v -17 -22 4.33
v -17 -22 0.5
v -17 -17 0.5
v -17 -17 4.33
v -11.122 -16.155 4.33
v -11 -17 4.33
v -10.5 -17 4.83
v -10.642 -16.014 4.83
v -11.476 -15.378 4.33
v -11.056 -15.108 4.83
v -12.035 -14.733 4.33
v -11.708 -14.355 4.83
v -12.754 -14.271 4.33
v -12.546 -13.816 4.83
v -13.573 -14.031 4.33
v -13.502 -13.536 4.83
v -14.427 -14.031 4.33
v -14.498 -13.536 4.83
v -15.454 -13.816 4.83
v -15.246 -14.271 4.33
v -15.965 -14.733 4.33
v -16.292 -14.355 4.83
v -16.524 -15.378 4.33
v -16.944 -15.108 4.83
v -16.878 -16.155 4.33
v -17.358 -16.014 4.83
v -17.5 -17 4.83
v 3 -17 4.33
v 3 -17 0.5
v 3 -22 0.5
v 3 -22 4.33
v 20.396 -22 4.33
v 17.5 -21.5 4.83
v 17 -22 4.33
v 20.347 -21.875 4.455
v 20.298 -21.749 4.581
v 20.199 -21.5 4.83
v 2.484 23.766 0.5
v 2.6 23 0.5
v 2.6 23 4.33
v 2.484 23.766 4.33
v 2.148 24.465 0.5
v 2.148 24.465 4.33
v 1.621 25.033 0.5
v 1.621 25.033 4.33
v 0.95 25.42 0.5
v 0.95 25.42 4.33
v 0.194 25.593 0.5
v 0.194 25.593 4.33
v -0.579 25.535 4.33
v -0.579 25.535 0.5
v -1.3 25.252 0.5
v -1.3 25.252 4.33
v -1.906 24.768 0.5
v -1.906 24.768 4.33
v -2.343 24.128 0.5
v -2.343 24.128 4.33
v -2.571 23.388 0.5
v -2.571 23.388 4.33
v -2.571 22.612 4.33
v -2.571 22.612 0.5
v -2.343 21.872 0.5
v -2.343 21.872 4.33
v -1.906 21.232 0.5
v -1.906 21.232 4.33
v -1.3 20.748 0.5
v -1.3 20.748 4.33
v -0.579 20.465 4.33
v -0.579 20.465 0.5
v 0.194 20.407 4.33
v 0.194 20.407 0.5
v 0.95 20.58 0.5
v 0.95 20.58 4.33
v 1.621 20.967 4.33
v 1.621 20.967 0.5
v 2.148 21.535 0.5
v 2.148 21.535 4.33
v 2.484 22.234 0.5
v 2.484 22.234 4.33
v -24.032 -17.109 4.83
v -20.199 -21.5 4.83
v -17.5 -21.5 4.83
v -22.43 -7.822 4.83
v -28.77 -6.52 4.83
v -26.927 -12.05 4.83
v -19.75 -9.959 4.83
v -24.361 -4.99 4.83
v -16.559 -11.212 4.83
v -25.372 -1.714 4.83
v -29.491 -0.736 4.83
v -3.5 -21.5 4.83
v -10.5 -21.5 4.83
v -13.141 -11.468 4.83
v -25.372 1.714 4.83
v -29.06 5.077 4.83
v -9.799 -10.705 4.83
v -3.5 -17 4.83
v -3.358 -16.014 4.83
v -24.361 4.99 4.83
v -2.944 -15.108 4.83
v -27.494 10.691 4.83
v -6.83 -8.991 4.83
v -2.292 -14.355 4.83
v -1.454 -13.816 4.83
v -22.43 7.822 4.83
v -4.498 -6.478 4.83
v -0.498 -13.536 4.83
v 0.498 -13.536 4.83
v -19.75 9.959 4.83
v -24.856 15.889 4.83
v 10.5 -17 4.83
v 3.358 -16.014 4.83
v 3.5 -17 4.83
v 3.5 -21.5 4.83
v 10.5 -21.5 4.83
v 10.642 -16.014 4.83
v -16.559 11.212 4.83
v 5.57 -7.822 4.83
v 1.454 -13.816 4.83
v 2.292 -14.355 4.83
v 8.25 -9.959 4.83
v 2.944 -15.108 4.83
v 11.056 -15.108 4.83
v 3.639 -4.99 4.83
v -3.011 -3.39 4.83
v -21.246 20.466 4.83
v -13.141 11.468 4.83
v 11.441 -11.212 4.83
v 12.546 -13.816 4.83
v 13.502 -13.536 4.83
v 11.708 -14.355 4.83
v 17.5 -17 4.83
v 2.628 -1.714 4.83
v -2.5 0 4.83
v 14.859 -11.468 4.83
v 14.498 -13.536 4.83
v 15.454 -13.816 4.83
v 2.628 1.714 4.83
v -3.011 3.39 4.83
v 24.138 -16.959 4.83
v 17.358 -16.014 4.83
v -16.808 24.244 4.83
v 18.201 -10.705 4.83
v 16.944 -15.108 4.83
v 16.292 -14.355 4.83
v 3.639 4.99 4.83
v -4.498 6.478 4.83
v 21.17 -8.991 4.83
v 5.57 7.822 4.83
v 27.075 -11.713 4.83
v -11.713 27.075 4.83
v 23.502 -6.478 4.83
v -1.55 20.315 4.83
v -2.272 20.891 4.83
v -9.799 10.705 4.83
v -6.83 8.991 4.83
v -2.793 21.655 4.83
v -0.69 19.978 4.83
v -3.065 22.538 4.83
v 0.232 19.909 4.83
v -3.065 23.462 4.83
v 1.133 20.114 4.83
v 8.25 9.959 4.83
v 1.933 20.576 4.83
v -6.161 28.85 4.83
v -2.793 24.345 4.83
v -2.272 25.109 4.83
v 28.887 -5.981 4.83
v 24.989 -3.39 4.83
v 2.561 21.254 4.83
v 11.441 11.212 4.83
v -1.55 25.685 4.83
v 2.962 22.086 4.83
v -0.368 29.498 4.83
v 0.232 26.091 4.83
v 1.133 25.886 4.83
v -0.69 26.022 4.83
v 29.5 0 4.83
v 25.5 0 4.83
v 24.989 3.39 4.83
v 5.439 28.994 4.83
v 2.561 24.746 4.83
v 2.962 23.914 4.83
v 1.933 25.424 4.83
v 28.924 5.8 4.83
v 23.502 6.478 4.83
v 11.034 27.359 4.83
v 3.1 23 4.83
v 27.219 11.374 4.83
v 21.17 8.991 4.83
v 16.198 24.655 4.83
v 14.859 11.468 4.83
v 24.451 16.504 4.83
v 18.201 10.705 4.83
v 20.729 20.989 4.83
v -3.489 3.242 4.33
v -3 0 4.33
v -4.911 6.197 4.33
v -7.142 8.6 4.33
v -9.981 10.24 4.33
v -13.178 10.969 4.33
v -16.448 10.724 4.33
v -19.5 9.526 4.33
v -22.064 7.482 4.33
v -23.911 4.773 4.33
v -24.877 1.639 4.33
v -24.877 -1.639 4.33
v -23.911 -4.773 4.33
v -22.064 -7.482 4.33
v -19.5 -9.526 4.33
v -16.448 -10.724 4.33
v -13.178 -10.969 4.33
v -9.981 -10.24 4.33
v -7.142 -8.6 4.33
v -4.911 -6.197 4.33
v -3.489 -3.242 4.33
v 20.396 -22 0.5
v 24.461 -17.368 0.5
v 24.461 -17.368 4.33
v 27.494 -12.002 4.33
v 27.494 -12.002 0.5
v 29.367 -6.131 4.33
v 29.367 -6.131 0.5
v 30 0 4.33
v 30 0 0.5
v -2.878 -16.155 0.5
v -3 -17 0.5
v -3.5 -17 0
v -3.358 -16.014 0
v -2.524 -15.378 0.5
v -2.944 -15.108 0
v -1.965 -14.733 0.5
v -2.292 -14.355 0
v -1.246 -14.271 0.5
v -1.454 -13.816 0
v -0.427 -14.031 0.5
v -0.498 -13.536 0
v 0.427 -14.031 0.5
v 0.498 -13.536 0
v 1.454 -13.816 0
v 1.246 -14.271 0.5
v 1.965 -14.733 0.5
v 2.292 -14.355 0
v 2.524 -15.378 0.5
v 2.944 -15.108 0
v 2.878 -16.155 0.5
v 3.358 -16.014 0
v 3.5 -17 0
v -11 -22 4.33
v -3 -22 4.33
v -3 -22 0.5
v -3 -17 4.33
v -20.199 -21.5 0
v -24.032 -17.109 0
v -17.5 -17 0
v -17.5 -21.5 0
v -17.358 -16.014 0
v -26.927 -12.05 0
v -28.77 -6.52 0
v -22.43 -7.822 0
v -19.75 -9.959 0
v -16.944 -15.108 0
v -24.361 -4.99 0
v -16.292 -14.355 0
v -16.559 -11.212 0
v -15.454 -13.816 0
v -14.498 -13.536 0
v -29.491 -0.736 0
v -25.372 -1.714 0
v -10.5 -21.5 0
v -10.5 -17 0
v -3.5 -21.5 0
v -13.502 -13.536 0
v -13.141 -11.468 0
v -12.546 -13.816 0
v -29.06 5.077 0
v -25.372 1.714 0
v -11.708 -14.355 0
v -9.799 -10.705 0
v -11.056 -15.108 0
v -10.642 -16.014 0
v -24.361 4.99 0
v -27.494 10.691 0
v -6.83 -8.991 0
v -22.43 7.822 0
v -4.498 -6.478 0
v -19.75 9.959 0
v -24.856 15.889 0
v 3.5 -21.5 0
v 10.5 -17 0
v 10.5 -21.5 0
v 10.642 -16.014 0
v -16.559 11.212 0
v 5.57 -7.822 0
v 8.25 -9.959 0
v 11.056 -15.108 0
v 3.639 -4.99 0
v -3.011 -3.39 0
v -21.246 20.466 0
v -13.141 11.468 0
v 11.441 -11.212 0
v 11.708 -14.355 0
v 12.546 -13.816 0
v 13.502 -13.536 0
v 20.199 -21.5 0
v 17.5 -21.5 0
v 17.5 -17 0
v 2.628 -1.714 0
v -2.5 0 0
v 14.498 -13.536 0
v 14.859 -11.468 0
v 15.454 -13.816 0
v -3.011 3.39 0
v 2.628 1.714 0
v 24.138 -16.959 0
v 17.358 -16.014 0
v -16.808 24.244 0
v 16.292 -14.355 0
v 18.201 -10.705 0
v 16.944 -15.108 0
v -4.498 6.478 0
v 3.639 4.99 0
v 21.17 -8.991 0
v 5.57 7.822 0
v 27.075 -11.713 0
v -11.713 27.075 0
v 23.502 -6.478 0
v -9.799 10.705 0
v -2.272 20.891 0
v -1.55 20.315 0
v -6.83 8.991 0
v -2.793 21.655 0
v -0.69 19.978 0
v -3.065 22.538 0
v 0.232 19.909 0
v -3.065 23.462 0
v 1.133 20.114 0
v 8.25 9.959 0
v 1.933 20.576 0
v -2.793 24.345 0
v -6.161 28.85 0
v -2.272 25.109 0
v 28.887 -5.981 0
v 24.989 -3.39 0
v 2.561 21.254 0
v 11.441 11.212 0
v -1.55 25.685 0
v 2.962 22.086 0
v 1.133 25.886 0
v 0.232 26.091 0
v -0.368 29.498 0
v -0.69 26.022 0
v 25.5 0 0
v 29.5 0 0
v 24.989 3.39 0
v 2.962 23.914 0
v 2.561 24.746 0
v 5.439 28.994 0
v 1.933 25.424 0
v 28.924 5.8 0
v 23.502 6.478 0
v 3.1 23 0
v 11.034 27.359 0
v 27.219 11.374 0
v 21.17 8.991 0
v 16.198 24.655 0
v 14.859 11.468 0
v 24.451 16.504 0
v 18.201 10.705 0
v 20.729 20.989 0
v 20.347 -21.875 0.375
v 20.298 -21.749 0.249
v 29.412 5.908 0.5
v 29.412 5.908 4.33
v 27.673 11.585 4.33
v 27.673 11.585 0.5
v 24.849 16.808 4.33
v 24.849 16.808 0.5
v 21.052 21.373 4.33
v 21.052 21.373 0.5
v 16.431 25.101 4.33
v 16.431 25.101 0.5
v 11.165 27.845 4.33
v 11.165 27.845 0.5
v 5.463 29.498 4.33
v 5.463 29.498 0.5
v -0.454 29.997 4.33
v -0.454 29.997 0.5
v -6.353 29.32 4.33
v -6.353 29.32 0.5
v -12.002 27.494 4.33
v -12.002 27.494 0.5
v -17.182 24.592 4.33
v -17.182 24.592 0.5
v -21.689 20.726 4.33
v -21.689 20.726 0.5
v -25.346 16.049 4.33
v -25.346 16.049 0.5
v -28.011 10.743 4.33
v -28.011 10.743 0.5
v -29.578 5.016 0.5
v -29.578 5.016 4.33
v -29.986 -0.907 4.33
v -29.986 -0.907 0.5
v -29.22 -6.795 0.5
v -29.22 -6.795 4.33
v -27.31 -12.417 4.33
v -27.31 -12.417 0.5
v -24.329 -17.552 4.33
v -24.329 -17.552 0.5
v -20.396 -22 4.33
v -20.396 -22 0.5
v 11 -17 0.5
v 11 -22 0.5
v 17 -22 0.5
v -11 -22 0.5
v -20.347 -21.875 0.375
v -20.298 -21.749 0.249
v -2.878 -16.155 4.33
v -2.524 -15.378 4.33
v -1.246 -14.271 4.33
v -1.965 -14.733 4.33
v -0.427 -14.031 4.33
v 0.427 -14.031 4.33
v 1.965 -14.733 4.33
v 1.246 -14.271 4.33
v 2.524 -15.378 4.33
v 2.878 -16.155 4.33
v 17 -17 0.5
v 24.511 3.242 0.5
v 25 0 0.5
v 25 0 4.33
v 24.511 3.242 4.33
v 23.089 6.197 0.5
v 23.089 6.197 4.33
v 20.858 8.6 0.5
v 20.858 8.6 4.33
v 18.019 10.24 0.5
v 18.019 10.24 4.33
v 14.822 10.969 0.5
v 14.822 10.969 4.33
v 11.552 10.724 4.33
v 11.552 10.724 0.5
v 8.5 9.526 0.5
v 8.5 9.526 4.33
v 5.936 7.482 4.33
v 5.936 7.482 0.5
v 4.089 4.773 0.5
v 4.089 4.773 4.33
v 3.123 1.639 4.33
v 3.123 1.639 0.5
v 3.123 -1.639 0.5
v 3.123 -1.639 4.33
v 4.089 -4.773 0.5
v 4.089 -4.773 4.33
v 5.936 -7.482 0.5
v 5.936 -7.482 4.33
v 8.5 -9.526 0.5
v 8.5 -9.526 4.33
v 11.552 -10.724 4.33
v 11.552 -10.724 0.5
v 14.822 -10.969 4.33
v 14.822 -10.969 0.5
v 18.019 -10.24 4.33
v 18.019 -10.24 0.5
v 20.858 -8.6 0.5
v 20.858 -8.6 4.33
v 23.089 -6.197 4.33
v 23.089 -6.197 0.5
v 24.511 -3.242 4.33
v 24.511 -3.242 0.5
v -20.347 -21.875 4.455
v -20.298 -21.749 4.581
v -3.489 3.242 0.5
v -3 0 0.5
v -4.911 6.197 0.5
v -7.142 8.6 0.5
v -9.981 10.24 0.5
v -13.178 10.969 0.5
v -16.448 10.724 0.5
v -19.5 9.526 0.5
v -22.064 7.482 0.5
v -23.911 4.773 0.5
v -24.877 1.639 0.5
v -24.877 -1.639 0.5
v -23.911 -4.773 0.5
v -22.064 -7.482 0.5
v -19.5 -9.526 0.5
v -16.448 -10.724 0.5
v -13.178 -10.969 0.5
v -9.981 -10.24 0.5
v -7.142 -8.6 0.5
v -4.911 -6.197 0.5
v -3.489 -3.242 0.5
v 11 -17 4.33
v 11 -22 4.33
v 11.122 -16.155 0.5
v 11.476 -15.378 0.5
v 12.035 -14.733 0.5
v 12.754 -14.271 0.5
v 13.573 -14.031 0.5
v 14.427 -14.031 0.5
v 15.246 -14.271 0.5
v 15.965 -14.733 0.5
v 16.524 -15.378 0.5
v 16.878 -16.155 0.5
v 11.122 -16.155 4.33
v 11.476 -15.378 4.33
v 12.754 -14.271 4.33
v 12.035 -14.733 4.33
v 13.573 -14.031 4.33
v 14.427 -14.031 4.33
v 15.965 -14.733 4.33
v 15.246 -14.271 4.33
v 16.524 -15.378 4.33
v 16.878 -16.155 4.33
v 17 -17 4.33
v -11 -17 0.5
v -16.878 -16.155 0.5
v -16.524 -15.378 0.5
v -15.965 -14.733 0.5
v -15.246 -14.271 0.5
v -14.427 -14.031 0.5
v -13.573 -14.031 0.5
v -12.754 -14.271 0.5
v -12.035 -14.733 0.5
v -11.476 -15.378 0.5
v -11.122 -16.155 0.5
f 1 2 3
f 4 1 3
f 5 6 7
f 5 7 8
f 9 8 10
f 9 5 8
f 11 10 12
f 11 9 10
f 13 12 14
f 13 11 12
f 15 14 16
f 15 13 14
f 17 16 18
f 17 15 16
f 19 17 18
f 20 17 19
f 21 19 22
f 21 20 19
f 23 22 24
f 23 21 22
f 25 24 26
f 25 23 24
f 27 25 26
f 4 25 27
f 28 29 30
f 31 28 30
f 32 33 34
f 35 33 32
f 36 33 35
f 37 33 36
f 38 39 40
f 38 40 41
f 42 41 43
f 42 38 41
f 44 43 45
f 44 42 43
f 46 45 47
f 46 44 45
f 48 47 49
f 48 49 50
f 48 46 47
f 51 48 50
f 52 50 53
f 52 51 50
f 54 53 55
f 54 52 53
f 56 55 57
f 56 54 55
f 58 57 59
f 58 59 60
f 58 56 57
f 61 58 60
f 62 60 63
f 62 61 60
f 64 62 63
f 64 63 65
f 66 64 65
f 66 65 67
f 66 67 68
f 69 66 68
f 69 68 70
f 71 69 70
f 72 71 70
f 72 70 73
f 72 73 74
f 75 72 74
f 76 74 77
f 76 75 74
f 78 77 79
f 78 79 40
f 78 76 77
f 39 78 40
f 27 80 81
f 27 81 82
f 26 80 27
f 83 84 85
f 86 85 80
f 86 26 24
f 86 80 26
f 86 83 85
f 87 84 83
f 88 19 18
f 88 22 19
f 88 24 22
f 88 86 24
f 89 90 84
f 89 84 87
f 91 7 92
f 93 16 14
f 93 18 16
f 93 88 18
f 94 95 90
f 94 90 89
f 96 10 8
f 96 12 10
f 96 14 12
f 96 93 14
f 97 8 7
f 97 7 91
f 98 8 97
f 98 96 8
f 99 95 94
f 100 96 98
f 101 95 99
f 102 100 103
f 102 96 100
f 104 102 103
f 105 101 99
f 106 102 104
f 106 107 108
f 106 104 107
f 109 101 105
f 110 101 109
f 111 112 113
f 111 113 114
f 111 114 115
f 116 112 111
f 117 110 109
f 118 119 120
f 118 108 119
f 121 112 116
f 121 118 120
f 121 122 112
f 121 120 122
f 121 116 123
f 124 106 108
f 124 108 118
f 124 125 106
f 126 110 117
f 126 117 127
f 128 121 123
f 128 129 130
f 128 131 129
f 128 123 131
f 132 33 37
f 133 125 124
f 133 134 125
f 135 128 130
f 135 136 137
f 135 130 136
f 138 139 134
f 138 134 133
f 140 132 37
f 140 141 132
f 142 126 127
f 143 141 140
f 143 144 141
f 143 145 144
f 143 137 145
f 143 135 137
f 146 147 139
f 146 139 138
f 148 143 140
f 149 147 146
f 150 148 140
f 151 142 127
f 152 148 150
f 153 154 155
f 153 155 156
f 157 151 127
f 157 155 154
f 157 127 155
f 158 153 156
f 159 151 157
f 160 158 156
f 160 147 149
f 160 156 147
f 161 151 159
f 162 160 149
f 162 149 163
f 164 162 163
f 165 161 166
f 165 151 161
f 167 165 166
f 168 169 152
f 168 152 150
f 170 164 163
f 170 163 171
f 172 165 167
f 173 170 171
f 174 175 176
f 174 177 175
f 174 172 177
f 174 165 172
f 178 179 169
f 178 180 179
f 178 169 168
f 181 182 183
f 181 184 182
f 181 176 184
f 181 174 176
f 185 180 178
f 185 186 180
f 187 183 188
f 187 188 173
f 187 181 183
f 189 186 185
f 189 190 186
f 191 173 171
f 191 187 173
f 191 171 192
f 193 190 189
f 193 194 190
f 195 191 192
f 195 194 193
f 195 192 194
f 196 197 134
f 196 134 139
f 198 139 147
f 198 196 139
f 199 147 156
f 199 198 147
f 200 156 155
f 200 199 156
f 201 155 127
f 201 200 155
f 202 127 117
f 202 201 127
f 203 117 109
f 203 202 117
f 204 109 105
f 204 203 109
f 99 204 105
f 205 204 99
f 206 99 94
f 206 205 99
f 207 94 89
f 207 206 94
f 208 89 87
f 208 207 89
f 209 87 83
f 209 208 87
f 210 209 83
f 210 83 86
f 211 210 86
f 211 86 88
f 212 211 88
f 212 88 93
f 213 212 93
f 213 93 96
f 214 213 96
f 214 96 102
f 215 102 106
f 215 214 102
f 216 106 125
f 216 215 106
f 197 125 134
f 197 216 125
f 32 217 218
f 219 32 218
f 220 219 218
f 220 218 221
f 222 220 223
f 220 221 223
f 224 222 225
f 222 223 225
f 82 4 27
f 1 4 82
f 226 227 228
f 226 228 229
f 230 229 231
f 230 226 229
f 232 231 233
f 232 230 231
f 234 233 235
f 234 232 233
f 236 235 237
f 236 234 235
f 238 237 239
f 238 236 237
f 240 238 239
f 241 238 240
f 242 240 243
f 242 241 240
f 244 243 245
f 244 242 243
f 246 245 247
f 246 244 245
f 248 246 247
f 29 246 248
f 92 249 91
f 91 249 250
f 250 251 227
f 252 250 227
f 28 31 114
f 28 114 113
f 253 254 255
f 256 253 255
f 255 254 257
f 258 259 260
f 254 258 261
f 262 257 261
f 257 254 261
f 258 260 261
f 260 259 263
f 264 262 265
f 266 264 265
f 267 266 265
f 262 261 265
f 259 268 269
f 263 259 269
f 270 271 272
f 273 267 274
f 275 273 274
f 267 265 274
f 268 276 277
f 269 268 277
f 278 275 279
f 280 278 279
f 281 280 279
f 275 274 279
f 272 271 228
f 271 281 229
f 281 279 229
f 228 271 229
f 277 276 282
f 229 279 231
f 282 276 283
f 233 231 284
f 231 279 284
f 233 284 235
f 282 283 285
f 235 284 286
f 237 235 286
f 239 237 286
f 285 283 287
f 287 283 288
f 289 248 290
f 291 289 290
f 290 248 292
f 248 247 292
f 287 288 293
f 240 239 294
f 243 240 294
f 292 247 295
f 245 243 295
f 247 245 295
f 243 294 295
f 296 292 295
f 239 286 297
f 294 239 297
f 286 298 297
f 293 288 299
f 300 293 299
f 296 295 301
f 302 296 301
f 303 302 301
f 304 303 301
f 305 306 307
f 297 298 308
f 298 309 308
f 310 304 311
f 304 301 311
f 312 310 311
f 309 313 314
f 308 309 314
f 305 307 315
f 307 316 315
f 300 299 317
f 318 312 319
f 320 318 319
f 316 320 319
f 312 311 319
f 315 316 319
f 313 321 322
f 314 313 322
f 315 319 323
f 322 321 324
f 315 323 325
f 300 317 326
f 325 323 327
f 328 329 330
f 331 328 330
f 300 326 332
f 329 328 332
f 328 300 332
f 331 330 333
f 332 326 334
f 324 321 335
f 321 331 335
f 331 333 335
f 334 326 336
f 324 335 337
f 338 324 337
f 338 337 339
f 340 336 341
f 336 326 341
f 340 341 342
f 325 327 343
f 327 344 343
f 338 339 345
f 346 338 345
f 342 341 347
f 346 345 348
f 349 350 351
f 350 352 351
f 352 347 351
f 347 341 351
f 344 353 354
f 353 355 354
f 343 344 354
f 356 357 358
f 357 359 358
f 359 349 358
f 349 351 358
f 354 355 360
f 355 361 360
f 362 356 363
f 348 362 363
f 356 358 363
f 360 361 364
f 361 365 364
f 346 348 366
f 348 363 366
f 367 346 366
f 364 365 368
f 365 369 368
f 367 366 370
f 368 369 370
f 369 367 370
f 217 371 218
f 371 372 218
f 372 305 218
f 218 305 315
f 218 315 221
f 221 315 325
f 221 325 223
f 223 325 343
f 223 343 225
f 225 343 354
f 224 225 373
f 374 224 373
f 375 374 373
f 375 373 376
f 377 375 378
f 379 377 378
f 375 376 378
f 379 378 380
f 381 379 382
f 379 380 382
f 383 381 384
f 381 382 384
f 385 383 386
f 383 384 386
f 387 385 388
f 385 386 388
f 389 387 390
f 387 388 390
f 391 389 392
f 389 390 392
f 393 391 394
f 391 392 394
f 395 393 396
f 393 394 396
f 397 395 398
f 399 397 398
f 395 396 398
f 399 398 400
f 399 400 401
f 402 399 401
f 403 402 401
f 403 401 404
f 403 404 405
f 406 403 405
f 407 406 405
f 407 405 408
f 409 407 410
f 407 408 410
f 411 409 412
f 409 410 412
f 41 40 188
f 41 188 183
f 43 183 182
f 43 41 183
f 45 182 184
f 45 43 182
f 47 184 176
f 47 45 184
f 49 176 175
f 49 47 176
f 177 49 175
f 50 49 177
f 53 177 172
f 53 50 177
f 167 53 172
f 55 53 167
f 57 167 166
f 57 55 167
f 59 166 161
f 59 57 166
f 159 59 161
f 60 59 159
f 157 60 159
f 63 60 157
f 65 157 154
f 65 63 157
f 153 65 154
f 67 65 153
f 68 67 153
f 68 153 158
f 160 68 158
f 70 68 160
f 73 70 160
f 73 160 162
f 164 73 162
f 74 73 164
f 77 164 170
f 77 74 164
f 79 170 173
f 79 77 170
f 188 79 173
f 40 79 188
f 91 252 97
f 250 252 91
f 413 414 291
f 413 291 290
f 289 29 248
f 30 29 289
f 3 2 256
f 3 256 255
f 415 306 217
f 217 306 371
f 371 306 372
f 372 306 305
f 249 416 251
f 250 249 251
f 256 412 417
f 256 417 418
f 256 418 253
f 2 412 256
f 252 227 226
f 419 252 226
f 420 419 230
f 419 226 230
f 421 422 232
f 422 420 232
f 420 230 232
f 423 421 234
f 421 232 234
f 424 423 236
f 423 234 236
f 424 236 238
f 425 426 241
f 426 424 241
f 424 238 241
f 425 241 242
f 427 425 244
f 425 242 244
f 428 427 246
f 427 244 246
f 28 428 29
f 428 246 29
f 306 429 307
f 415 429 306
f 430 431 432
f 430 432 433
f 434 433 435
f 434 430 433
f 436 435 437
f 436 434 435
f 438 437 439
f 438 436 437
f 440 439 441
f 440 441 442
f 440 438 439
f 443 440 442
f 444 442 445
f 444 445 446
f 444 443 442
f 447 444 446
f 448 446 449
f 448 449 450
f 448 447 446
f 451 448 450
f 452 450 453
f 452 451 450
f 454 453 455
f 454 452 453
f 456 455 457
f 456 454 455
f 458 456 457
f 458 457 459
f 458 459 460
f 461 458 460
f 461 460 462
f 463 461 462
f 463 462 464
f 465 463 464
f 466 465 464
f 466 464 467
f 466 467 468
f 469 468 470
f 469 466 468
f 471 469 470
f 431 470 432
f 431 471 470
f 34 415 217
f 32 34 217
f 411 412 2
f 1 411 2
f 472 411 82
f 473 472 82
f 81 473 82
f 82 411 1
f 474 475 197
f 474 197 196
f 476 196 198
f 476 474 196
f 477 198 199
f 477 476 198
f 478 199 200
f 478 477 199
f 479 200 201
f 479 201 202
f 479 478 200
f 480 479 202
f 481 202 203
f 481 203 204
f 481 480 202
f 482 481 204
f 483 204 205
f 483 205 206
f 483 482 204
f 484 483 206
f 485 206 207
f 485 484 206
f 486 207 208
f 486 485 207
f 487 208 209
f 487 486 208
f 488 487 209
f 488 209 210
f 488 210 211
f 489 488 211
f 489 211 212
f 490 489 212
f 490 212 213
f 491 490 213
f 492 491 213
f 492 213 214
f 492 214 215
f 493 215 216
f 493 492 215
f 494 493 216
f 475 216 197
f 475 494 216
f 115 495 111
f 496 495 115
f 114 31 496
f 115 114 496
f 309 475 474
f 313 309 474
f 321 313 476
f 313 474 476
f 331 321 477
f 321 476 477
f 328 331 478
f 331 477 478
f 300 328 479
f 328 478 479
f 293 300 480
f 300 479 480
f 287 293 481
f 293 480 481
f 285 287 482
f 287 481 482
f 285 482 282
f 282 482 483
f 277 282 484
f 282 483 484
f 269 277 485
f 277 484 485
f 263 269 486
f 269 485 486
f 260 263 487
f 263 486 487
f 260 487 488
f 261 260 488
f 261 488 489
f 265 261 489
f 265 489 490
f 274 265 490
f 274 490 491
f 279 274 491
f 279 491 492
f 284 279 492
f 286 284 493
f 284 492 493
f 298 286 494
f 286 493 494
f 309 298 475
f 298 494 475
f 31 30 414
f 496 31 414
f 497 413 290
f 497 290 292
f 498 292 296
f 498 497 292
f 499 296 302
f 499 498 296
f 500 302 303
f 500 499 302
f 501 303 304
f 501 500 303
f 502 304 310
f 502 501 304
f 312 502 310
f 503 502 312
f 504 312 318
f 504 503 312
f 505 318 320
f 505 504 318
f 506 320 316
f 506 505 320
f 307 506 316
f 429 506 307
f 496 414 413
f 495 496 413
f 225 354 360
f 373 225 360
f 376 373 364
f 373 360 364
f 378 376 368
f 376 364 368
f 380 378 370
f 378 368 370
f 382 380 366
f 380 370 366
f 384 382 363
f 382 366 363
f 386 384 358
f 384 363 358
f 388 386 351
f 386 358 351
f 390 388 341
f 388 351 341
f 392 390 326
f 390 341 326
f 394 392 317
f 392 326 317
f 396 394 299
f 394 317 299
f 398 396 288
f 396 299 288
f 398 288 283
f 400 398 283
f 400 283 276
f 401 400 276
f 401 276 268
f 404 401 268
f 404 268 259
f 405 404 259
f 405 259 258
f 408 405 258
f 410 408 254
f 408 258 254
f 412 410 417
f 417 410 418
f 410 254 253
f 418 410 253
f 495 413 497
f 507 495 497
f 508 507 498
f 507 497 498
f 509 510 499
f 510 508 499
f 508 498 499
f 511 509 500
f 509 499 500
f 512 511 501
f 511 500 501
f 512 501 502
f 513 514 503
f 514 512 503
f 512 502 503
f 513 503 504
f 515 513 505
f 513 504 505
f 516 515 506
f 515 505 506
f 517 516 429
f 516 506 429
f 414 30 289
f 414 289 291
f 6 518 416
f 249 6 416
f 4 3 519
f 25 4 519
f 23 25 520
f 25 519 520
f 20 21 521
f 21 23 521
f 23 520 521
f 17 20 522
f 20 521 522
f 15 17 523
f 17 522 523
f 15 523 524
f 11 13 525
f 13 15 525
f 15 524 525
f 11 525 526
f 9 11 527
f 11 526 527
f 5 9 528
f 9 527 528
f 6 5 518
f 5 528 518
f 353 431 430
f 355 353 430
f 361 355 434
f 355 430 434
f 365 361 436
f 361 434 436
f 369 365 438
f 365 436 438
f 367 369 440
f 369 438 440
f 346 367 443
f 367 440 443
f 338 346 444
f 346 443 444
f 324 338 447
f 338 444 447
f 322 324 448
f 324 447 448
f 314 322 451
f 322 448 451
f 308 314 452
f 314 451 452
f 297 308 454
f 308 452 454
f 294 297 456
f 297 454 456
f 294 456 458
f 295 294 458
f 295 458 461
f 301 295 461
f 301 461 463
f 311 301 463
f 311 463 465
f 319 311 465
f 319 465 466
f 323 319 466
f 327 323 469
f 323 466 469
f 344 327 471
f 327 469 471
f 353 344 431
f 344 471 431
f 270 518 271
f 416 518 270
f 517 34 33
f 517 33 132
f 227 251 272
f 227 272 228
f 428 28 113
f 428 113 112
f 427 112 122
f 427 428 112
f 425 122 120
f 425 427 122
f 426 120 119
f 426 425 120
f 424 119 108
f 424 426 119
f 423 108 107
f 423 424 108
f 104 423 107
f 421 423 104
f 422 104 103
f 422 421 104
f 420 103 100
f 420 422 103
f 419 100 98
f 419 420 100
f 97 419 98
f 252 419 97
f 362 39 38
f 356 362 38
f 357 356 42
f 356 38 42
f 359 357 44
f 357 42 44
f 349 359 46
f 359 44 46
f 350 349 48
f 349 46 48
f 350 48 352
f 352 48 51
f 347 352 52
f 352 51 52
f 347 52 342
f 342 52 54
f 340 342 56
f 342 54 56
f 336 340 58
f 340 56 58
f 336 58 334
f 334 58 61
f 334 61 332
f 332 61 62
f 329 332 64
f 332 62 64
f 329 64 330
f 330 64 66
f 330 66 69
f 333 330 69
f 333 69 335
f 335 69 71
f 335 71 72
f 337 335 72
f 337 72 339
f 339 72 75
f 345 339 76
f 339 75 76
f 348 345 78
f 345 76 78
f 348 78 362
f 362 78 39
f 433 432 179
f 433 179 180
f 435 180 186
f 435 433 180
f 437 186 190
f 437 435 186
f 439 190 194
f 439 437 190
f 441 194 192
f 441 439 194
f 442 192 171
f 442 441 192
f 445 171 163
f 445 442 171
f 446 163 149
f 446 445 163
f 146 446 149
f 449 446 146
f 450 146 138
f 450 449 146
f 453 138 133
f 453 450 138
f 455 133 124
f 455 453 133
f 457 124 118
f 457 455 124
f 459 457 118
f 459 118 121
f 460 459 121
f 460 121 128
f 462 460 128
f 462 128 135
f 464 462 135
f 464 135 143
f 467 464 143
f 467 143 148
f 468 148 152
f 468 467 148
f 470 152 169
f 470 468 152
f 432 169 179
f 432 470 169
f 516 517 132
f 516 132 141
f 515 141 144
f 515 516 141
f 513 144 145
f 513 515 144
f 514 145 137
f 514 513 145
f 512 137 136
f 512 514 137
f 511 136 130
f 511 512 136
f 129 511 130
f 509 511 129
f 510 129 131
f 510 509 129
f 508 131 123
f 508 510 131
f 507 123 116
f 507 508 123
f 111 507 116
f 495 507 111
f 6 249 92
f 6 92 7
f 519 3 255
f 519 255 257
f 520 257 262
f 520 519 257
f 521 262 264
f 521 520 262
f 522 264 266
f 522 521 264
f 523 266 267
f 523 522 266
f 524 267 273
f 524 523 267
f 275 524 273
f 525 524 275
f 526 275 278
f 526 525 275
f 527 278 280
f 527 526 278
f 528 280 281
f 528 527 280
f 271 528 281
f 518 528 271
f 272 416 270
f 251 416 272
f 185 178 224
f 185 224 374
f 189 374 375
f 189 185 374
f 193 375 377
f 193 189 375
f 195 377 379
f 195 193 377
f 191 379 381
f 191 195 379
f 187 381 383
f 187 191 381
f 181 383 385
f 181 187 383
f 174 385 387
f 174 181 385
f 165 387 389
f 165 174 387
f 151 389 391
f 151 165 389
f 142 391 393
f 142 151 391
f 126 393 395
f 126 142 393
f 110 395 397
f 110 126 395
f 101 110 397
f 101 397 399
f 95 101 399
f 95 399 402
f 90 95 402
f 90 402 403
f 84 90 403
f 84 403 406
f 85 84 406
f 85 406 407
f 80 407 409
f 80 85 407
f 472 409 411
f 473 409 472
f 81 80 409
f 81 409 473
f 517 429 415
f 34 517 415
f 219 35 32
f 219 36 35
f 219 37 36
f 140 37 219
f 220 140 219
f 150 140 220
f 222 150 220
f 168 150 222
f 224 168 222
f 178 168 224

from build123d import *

# Parameters (mm, degrees)
F0_R     = 11
F0_R_2   = 2.6
F1_DEPTH = 4.83
F3_DEPTH = 25
F4_SIZE  = 0.5


with BuildPart() as f1:
    # F0 (on Top) → F1 (new body)
    with BuildSketch(Plane.XY):
        with BuildLine():
            ThreePointArc((20.396078, -22), (27.494384, -12.002451), (30, 0))
            ThreePointArc((30, 0), (-12.002451, 27.494384), (-20.396078, -22))
            Line((-20.396078, -22), (20.396078, -22))
        make_face()
        with Locations((-14, 0)):
            Circle(F0_R, mode=Mode.SUBTRACT)
        with Locations((14, 0)):
            Circle(F0_R, mode=Mode.SUBTRACT)
        with Locations((0, 23)):
            Circle(F0_R_2, mode=Mode.SUBTRACT)
    extrude(amount=F1_DEPTH)

    # F2 (on face) → F3 (cut)
    with BuildSketch(Plane(origin=(0, 0, 0), x_dir=(1, 0, 0), z_dir=(0, 0, -1))):
        with BuildLine():
            ThreePointArc((3, 22), (0, 25), (-3, 22))
            Line((-3, 22), (-3, 17))
            ThreePointArc((-3, 17), (0, 14), (3, 17))
            Line((3, 17), (3, 22))
        make_face()
        with BuildLine():
            ThreePointArc((17, 22), (14, 25), (11, 22))
            Line((11, 22), (11, 17))
            ThreePointArc((11, 17), (14, 14), (17, 17))
            Line((17, 17), (17, 22))
        make_face()
        with BuildLine():
            ThreePointArc((-11, 22), (-14, 25), (-17, 22))
            Line((-17, 22), (-17, 17))
            ThreePointArc((-17, 17), (-14, 14), (-11, 17))
            Line((-11, 17), (-11, 22))
        make_face()
    extrude(amount=-F3_DEPTH, mode=Mode.SUBTRACT)

    # F4
    f4_edges = [f1.edges().sort_by_distance(p)[0] for p in [
        (0, 30, 0),
        (18.698039, -22, 0),
        (17, -19.5, 0),
        (14, -14, 0),
        (11, -19.5, 0),
        (7, -22, 0),
        (3, -19.5, 0),
        (0, -14, 0),
        (-3, -19.5, 0),
        (-7, -22, 0),
        (-11, -19.5, 0),
        (-14, -14, 0),
        (-17, -19.5, 0),
        (-18.698039, -22, 0),
        (-25, 0, 0),
        (3, 0, 0),
        (-2.6, 23, 0),
        (0, 30, 4.83),
        (18.698039, -22, 4.83),
        (17, -19.5, 4.83),
        (14, -14, 4.83),
        (11, -19.5, 4.83),
        (7, -22, 4.83),
        (3, -19.5, 4.83),
        (0, -14, 4.83),
        (-3, -19.5, 4.83),
        (-7, -22, 4.83),
        (-11, -19.5, 4.83),
        (-14, -14, 4.83),
        (-17, -19.5, 4.83),
        (-18.698039, -22, 4.83),
        (-25, 0, 4.83),
        (3, 0, 4.83),
        (-2.6, 23, 4.83),
    ]]
    chamfer(f4_edges, length=F4_SIZE)


solid = f1.part
